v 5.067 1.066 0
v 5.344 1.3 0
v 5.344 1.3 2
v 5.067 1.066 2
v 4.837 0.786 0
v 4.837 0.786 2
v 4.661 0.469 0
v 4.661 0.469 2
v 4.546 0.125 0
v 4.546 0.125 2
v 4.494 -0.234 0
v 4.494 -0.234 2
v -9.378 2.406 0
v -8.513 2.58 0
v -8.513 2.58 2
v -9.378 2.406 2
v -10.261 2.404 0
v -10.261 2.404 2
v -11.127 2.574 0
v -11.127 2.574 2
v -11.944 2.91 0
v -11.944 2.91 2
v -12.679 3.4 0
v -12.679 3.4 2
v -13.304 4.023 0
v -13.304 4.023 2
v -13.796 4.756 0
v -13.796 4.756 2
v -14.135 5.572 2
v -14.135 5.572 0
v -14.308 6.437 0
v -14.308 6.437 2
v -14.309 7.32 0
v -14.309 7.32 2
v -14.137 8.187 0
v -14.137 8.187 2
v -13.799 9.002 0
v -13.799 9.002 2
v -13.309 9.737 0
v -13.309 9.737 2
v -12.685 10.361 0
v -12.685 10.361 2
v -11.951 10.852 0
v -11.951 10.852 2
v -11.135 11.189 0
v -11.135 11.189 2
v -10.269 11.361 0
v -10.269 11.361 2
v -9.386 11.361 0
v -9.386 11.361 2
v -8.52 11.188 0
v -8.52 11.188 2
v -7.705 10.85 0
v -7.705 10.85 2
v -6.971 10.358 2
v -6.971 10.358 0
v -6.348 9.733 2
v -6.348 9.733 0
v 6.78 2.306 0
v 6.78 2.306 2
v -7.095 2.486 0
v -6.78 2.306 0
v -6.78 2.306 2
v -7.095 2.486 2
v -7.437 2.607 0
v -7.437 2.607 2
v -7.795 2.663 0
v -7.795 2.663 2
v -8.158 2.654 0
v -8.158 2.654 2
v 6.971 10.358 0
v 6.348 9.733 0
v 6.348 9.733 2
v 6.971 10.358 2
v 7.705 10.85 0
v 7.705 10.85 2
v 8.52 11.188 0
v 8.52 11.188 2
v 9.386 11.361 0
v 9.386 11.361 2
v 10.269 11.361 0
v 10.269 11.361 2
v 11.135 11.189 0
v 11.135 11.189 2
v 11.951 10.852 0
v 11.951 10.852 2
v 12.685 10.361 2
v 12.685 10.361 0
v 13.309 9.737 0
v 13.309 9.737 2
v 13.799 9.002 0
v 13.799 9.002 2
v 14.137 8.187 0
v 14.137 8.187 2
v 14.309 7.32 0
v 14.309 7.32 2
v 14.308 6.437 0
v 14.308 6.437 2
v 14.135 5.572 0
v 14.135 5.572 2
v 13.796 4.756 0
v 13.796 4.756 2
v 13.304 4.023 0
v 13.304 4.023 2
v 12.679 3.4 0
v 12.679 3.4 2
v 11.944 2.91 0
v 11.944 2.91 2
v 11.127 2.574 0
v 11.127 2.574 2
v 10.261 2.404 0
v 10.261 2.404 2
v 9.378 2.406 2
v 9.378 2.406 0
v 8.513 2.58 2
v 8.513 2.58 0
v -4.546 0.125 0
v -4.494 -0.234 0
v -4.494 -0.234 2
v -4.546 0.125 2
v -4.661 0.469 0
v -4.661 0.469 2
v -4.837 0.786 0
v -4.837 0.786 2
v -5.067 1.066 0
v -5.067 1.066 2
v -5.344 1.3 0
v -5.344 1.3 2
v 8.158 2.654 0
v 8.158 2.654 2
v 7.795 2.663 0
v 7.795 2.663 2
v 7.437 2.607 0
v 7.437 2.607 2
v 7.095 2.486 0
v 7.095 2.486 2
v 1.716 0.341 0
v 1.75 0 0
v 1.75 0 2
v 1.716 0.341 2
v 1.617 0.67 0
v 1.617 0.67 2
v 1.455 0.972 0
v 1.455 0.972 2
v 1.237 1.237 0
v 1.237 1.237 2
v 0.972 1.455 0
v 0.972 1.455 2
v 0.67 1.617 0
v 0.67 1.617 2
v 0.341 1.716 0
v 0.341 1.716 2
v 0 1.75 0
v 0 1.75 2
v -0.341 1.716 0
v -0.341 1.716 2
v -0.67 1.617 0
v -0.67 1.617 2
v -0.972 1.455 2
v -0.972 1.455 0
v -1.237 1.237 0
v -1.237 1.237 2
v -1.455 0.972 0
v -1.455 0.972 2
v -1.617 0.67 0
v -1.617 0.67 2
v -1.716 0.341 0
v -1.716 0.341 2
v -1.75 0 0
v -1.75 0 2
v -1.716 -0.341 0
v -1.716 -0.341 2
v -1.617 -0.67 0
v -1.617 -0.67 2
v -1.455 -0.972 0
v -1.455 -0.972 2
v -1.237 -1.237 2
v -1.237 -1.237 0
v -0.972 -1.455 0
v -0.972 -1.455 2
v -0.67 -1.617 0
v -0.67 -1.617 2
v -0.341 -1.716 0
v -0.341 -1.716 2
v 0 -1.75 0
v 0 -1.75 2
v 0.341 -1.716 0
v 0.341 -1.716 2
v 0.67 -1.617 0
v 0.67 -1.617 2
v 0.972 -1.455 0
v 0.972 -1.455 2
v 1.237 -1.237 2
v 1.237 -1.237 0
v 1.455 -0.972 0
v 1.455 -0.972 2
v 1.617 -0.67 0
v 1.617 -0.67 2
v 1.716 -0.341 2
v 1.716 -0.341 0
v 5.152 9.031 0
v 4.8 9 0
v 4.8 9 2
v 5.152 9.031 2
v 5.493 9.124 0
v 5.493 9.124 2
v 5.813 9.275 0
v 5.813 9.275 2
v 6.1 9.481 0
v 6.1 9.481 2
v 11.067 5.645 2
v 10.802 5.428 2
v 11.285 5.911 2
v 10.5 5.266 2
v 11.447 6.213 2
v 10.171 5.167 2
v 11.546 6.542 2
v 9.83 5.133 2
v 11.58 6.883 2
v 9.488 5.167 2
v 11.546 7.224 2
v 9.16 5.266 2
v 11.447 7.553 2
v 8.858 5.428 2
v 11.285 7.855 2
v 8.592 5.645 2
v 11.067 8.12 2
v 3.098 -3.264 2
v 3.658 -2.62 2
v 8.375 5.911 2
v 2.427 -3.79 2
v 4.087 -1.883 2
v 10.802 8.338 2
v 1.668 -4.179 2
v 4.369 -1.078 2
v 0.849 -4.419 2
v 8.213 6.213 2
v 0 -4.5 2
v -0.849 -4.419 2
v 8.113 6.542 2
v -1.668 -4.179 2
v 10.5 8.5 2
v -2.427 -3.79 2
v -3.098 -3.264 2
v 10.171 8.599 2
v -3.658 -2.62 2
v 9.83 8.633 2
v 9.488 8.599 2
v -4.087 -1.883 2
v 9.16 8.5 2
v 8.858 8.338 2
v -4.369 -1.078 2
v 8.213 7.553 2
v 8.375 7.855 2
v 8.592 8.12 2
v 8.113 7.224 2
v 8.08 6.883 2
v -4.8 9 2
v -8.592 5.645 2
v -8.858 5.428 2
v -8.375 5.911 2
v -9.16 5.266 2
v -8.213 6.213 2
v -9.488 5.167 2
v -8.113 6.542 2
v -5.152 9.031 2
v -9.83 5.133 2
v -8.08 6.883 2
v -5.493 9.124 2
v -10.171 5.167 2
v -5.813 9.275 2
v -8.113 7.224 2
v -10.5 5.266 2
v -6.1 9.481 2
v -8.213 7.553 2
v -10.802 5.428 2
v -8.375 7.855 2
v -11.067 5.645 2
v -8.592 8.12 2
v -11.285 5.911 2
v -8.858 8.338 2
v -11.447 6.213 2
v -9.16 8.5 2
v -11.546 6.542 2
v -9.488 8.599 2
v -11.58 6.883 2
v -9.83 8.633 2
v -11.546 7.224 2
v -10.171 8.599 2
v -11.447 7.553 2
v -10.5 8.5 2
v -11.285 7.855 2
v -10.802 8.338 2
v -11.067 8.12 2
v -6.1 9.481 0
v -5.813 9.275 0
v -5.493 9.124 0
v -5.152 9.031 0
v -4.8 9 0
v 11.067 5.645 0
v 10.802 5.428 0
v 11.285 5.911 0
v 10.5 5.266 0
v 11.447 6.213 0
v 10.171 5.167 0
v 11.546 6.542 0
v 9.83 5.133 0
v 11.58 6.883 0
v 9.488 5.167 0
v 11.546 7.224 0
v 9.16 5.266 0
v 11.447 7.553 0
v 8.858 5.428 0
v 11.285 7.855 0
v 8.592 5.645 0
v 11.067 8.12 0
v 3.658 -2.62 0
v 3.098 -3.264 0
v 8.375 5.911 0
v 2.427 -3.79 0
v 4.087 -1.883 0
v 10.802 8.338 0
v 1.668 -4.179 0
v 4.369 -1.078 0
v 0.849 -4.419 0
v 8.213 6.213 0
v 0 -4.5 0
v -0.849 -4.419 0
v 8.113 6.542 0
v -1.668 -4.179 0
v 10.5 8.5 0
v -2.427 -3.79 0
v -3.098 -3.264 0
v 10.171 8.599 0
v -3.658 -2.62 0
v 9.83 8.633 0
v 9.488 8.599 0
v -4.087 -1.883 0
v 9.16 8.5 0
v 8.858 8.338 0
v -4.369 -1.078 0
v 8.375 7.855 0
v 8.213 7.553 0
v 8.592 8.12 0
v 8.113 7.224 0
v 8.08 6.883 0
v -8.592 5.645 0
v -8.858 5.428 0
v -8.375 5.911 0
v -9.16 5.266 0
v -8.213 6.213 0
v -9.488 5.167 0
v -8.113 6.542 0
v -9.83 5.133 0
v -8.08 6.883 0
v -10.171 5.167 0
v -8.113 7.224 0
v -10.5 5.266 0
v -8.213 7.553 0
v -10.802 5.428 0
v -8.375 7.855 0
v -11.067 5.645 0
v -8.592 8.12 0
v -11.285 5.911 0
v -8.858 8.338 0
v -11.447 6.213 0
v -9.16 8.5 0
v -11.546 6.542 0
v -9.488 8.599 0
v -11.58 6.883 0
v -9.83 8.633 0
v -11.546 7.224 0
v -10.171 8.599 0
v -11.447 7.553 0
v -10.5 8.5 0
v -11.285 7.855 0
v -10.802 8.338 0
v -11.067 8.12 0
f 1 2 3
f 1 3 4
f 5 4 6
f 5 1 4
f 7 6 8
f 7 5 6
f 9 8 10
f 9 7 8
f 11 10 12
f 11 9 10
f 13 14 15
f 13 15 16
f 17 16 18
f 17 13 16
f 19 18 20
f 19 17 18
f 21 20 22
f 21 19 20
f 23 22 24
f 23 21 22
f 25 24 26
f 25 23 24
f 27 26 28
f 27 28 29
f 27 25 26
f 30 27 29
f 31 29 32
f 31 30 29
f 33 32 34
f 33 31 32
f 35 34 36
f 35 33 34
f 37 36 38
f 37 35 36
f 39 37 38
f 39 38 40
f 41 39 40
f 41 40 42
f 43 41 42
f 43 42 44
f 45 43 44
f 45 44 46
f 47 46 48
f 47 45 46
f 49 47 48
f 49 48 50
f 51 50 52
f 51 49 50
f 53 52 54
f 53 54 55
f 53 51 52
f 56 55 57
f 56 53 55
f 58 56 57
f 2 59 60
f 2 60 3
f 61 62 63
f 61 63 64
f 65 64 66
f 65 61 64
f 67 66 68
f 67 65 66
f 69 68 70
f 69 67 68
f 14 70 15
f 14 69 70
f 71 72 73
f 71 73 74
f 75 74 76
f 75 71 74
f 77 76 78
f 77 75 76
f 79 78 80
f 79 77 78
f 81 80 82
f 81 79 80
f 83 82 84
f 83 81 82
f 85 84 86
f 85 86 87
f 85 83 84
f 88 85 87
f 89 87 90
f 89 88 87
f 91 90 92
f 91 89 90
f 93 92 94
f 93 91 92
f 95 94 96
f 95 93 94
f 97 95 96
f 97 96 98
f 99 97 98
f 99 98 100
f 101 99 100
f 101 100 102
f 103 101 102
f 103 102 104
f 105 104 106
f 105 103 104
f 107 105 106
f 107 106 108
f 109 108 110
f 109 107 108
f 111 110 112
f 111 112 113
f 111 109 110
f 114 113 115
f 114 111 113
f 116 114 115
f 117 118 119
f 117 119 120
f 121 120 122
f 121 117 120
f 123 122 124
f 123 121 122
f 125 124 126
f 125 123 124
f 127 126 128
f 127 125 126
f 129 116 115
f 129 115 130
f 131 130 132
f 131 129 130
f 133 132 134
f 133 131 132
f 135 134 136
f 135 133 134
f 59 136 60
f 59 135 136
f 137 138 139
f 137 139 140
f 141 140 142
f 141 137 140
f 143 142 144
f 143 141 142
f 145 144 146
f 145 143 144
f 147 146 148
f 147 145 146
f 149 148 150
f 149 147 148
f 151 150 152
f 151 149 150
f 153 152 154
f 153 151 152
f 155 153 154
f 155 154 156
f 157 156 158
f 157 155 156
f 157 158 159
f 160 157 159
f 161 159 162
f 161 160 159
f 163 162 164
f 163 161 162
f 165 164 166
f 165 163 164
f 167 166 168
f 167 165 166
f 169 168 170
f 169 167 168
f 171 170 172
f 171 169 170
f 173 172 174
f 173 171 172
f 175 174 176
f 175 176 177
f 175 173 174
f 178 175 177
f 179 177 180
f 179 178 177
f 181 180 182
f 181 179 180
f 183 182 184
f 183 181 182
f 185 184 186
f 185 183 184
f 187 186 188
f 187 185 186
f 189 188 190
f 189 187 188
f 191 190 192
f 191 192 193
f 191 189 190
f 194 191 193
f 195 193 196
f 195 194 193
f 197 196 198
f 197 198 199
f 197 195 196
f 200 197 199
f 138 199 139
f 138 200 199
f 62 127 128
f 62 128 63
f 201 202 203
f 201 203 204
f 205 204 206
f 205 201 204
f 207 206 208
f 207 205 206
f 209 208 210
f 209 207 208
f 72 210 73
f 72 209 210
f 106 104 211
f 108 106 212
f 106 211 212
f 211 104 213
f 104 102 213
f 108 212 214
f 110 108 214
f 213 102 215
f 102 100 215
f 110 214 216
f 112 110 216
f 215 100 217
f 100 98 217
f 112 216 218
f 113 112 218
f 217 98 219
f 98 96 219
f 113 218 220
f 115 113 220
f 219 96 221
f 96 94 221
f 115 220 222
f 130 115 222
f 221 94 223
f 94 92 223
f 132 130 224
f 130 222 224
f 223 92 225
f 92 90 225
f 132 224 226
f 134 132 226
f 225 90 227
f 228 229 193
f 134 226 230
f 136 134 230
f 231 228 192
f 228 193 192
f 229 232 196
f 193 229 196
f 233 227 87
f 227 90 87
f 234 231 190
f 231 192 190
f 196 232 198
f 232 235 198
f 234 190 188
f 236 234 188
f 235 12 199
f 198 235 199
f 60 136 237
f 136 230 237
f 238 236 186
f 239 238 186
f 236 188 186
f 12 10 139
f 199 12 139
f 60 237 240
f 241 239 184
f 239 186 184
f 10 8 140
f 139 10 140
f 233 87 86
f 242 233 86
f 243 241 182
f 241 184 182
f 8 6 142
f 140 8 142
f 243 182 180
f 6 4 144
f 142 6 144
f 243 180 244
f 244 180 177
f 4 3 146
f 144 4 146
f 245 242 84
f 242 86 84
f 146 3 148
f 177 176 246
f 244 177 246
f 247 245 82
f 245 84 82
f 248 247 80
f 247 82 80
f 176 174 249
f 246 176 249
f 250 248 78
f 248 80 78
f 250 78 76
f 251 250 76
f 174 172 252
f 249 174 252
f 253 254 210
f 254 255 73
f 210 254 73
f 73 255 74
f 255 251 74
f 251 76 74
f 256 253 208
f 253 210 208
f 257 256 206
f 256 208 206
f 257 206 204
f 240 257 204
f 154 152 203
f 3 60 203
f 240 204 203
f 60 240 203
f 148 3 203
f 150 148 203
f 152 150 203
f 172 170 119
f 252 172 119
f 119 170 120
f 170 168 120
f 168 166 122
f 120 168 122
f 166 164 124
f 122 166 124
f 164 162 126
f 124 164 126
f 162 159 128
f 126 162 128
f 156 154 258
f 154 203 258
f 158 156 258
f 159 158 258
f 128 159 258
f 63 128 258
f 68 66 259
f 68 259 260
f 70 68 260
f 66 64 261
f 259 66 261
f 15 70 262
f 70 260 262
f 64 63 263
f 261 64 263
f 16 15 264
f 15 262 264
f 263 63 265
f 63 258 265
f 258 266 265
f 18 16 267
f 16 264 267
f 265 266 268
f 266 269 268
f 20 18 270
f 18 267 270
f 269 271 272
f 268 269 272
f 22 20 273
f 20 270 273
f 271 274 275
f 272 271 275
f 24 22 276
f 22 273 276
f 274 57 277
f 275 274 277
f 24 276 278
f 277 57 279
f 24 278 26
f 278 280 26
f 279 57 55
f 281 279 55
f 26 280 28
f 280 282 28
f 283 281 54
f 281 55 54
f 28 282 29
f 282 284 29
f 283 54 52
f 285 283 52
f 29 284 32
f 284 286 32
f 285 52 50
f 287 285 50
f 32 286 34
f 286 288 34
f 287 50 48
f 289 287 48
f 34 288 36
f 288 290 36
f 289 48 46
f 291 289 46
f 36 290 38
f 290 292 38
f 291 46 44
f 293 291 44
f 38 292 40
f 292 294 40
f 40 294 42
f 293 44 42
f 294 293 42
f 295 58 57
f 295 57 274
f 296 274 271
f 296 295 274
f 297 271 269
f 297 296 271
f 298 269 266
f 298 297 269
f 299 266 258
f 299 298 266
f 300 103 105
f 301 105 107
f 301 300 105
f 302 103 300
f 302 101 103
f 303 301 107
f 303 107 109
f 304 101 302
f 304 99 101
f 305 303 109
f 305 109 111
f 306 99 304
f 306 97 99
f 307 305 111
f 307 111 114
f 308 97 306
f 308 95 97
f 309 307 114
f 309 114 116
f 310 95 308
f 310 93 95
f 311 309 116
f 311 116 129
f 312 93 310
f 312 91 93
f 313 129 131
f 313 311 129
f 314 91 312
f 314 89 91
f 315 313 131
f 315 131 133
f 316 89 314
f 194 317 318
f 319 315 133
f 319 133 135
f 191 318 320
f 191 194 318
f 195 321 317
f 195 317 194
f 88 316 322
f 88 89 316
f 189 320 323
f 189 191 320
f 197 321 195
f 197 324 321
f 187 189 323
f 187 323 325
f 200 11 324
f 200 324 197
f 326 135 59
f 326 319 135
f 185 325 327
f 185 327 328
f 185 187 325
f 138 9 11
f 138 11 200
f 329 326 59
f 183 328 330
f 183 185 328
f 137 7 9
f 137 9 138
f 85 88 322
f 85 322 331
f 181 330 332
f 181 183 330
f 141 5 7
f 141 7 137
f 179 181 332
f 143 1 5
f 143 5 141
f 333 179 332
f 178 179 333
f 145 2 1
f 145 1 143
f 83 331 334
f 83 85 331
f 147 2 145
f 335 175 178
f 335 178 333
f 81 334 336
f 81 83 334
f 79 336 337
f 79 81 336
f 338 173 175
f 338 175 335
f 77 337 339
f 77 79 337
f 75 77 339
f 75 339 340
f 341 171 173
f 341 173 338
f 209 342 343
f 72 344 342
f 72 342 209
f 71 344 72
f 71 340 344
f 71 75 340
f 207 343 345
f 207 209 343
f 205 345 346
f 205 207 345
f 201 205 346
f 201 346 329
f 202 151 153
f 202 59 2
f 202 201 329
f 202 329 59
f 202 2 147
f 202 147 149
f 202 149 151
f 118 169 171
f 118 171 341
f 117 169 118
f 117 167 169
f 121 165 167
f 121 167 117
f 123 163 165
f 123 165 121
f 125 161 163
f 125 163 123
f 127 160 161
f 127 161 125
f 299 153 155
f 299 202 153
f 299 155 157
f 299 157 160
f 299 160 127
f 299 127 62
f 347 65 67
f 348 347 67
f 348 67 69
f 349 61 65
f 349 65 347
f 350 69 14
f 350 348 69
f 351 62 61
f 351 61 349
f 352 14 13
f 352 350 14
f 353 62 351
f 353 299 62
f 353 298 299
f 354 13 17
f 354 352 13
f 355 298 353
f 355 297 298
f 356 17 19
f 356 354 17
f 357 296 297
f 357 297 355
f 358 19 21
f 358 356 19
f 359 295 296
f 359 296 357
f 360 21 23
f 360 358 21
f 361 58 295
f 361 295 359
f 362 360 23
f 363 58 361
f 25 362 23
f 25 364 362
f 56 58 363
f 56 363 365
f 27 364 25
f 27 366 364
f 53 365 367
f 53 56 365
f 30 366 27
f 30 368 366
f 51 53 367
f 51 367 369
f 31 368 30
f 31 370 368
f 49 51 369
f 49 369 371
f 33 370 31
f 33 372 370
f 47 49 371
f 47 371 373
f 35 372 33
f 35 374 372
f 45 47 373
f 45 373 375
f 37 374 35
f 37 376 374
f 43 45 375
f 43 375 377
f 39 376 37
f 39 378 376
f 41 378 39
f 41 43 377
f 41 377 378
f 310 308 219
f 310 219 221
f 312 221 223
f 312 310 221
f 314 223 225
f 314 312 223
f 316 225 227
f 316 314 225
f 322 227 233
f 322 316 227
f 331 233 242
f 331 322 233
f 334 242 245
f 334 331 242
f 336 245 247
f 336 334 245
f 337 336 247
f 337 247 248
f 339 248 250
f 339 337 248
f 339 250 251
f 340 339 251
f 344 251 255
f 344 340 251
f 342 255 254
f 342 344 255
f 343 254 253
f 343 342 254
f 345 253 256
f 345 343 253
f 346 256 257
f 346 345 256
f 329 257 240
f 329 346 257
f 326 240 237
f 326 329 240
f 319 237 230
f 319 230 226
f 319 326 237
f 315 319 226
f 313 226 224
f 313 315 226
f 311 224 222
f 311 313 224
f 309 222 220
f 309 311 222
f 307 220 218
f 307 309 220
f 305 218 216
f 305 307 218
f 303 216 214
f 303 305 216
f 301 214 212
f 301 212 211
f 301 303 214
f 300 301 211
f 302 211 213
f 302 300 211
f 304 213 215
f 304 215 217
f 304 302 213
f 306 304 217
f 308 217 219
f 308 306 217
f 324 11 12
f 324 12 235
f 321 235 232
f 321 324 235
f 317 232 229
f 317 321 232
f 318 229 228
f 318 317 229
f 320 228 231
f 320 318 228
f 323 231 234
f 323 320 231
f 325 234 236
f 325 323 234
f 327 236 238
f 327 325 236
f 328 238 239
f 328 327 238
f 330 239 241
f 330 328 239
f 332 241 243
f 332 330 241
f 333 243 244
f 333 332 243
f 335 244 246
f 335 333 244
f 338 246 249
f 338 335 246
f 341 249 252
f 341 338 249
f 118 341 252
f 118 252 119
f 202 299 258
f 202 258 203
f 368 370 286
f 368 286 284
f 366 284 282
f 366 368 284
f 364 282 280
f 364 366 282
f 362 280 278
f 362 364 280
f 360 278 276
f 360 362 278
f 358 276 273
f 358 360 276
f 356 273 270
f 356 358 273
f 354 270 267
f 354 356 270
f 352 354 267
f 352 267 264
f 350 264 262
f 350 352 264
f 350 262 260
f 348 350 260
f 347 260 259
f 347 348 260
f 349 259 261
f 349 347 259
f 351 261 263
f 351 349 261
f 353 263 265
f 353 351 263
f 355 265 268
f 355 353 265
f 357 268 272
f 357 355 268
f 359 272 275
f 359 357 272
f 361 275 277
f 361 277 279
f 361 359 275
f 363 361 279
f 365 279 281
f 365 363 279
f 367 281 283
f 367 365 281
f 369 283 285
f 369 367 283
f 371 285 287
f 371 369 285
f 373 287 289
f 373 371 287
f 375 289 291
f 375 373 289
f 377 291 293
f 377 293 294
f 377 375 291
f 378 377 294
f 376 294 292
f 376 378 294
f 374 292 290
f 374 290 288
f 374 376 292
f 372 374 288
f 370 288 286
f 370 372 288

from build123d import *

# Parameters (mm, degrees)
SKETCH1_R           = 1.75
BOSS_EXTRUDE1_DEPTH = 2


with BuildPart() as part:
    # Sketch1 → Boss-Extrude1 (new body)
    with BuildSketch(Plane.XY):
        with BuildLine():
            Line((6.78007207, 2.305908396), (5.344058207, 1.300400663))
            ThreePointArc((5.344058207, 1.300400663), (4.741801382, 0.631408553), (4.493915363, -0.233933141))
            ThreePointArc((4.493915363, -0.233933141), (0, -4.5), (-4.493915363, -0.233933141))
            ThreePointArc((-4.493915363, -0.233933141), (-4.741801382, 0.631408553), (-5.344058207, 1.300400663))
            Line((-5.344058207, 1.300400663), (-6.78007207, 2.305908396))
            ThreePointArc((-6.78007207, 2.305908396), (-7.614702985, 2.643035912), (-8.512640201, 2.580008285))
            ThreePointArc((-8.512640201, 2.580008285), (-14.136868529, 8.186516868), (-6.347604272, 9.733205303))
            ThreePointArc((-6.347604272, 9.733205303), (-5.656224906, 9.192572354), (-4.799950824, 9))
            Line((-4.799950824, 9), (4.799950824, 9))
            ThreePointArc((4.799950824, 9), (5.656224906, 9.192572354), (6.347604272, 9.733205303))
            ThreePointArc((6.347604272, 9.733205303), (14.136868529, 8.186516868), (8.512640201, 2.580008285))
            ThreePointArc((8.512640201, 2.580008285), (7.614702985, 2.643035912), (6.78007207, 2.305908396))
        make_face()
        Circle(SKETCH1_R, mode=Mode.SUBTRACT)
        with Locations((9.829824531, 6.882917236)):
            Circle(SKETCH1_R, mode=Mode.SUBTRACT)
        with Locations(Location((-9.829824531, 6.882917236, 0), (0, 0, 180))):
            Circle(SKETCH1_R, mode=Mode.SUBTRACT)
    extrude(amount=BOSS_EXTRUDE1_DEPTH)


solid = part.part
